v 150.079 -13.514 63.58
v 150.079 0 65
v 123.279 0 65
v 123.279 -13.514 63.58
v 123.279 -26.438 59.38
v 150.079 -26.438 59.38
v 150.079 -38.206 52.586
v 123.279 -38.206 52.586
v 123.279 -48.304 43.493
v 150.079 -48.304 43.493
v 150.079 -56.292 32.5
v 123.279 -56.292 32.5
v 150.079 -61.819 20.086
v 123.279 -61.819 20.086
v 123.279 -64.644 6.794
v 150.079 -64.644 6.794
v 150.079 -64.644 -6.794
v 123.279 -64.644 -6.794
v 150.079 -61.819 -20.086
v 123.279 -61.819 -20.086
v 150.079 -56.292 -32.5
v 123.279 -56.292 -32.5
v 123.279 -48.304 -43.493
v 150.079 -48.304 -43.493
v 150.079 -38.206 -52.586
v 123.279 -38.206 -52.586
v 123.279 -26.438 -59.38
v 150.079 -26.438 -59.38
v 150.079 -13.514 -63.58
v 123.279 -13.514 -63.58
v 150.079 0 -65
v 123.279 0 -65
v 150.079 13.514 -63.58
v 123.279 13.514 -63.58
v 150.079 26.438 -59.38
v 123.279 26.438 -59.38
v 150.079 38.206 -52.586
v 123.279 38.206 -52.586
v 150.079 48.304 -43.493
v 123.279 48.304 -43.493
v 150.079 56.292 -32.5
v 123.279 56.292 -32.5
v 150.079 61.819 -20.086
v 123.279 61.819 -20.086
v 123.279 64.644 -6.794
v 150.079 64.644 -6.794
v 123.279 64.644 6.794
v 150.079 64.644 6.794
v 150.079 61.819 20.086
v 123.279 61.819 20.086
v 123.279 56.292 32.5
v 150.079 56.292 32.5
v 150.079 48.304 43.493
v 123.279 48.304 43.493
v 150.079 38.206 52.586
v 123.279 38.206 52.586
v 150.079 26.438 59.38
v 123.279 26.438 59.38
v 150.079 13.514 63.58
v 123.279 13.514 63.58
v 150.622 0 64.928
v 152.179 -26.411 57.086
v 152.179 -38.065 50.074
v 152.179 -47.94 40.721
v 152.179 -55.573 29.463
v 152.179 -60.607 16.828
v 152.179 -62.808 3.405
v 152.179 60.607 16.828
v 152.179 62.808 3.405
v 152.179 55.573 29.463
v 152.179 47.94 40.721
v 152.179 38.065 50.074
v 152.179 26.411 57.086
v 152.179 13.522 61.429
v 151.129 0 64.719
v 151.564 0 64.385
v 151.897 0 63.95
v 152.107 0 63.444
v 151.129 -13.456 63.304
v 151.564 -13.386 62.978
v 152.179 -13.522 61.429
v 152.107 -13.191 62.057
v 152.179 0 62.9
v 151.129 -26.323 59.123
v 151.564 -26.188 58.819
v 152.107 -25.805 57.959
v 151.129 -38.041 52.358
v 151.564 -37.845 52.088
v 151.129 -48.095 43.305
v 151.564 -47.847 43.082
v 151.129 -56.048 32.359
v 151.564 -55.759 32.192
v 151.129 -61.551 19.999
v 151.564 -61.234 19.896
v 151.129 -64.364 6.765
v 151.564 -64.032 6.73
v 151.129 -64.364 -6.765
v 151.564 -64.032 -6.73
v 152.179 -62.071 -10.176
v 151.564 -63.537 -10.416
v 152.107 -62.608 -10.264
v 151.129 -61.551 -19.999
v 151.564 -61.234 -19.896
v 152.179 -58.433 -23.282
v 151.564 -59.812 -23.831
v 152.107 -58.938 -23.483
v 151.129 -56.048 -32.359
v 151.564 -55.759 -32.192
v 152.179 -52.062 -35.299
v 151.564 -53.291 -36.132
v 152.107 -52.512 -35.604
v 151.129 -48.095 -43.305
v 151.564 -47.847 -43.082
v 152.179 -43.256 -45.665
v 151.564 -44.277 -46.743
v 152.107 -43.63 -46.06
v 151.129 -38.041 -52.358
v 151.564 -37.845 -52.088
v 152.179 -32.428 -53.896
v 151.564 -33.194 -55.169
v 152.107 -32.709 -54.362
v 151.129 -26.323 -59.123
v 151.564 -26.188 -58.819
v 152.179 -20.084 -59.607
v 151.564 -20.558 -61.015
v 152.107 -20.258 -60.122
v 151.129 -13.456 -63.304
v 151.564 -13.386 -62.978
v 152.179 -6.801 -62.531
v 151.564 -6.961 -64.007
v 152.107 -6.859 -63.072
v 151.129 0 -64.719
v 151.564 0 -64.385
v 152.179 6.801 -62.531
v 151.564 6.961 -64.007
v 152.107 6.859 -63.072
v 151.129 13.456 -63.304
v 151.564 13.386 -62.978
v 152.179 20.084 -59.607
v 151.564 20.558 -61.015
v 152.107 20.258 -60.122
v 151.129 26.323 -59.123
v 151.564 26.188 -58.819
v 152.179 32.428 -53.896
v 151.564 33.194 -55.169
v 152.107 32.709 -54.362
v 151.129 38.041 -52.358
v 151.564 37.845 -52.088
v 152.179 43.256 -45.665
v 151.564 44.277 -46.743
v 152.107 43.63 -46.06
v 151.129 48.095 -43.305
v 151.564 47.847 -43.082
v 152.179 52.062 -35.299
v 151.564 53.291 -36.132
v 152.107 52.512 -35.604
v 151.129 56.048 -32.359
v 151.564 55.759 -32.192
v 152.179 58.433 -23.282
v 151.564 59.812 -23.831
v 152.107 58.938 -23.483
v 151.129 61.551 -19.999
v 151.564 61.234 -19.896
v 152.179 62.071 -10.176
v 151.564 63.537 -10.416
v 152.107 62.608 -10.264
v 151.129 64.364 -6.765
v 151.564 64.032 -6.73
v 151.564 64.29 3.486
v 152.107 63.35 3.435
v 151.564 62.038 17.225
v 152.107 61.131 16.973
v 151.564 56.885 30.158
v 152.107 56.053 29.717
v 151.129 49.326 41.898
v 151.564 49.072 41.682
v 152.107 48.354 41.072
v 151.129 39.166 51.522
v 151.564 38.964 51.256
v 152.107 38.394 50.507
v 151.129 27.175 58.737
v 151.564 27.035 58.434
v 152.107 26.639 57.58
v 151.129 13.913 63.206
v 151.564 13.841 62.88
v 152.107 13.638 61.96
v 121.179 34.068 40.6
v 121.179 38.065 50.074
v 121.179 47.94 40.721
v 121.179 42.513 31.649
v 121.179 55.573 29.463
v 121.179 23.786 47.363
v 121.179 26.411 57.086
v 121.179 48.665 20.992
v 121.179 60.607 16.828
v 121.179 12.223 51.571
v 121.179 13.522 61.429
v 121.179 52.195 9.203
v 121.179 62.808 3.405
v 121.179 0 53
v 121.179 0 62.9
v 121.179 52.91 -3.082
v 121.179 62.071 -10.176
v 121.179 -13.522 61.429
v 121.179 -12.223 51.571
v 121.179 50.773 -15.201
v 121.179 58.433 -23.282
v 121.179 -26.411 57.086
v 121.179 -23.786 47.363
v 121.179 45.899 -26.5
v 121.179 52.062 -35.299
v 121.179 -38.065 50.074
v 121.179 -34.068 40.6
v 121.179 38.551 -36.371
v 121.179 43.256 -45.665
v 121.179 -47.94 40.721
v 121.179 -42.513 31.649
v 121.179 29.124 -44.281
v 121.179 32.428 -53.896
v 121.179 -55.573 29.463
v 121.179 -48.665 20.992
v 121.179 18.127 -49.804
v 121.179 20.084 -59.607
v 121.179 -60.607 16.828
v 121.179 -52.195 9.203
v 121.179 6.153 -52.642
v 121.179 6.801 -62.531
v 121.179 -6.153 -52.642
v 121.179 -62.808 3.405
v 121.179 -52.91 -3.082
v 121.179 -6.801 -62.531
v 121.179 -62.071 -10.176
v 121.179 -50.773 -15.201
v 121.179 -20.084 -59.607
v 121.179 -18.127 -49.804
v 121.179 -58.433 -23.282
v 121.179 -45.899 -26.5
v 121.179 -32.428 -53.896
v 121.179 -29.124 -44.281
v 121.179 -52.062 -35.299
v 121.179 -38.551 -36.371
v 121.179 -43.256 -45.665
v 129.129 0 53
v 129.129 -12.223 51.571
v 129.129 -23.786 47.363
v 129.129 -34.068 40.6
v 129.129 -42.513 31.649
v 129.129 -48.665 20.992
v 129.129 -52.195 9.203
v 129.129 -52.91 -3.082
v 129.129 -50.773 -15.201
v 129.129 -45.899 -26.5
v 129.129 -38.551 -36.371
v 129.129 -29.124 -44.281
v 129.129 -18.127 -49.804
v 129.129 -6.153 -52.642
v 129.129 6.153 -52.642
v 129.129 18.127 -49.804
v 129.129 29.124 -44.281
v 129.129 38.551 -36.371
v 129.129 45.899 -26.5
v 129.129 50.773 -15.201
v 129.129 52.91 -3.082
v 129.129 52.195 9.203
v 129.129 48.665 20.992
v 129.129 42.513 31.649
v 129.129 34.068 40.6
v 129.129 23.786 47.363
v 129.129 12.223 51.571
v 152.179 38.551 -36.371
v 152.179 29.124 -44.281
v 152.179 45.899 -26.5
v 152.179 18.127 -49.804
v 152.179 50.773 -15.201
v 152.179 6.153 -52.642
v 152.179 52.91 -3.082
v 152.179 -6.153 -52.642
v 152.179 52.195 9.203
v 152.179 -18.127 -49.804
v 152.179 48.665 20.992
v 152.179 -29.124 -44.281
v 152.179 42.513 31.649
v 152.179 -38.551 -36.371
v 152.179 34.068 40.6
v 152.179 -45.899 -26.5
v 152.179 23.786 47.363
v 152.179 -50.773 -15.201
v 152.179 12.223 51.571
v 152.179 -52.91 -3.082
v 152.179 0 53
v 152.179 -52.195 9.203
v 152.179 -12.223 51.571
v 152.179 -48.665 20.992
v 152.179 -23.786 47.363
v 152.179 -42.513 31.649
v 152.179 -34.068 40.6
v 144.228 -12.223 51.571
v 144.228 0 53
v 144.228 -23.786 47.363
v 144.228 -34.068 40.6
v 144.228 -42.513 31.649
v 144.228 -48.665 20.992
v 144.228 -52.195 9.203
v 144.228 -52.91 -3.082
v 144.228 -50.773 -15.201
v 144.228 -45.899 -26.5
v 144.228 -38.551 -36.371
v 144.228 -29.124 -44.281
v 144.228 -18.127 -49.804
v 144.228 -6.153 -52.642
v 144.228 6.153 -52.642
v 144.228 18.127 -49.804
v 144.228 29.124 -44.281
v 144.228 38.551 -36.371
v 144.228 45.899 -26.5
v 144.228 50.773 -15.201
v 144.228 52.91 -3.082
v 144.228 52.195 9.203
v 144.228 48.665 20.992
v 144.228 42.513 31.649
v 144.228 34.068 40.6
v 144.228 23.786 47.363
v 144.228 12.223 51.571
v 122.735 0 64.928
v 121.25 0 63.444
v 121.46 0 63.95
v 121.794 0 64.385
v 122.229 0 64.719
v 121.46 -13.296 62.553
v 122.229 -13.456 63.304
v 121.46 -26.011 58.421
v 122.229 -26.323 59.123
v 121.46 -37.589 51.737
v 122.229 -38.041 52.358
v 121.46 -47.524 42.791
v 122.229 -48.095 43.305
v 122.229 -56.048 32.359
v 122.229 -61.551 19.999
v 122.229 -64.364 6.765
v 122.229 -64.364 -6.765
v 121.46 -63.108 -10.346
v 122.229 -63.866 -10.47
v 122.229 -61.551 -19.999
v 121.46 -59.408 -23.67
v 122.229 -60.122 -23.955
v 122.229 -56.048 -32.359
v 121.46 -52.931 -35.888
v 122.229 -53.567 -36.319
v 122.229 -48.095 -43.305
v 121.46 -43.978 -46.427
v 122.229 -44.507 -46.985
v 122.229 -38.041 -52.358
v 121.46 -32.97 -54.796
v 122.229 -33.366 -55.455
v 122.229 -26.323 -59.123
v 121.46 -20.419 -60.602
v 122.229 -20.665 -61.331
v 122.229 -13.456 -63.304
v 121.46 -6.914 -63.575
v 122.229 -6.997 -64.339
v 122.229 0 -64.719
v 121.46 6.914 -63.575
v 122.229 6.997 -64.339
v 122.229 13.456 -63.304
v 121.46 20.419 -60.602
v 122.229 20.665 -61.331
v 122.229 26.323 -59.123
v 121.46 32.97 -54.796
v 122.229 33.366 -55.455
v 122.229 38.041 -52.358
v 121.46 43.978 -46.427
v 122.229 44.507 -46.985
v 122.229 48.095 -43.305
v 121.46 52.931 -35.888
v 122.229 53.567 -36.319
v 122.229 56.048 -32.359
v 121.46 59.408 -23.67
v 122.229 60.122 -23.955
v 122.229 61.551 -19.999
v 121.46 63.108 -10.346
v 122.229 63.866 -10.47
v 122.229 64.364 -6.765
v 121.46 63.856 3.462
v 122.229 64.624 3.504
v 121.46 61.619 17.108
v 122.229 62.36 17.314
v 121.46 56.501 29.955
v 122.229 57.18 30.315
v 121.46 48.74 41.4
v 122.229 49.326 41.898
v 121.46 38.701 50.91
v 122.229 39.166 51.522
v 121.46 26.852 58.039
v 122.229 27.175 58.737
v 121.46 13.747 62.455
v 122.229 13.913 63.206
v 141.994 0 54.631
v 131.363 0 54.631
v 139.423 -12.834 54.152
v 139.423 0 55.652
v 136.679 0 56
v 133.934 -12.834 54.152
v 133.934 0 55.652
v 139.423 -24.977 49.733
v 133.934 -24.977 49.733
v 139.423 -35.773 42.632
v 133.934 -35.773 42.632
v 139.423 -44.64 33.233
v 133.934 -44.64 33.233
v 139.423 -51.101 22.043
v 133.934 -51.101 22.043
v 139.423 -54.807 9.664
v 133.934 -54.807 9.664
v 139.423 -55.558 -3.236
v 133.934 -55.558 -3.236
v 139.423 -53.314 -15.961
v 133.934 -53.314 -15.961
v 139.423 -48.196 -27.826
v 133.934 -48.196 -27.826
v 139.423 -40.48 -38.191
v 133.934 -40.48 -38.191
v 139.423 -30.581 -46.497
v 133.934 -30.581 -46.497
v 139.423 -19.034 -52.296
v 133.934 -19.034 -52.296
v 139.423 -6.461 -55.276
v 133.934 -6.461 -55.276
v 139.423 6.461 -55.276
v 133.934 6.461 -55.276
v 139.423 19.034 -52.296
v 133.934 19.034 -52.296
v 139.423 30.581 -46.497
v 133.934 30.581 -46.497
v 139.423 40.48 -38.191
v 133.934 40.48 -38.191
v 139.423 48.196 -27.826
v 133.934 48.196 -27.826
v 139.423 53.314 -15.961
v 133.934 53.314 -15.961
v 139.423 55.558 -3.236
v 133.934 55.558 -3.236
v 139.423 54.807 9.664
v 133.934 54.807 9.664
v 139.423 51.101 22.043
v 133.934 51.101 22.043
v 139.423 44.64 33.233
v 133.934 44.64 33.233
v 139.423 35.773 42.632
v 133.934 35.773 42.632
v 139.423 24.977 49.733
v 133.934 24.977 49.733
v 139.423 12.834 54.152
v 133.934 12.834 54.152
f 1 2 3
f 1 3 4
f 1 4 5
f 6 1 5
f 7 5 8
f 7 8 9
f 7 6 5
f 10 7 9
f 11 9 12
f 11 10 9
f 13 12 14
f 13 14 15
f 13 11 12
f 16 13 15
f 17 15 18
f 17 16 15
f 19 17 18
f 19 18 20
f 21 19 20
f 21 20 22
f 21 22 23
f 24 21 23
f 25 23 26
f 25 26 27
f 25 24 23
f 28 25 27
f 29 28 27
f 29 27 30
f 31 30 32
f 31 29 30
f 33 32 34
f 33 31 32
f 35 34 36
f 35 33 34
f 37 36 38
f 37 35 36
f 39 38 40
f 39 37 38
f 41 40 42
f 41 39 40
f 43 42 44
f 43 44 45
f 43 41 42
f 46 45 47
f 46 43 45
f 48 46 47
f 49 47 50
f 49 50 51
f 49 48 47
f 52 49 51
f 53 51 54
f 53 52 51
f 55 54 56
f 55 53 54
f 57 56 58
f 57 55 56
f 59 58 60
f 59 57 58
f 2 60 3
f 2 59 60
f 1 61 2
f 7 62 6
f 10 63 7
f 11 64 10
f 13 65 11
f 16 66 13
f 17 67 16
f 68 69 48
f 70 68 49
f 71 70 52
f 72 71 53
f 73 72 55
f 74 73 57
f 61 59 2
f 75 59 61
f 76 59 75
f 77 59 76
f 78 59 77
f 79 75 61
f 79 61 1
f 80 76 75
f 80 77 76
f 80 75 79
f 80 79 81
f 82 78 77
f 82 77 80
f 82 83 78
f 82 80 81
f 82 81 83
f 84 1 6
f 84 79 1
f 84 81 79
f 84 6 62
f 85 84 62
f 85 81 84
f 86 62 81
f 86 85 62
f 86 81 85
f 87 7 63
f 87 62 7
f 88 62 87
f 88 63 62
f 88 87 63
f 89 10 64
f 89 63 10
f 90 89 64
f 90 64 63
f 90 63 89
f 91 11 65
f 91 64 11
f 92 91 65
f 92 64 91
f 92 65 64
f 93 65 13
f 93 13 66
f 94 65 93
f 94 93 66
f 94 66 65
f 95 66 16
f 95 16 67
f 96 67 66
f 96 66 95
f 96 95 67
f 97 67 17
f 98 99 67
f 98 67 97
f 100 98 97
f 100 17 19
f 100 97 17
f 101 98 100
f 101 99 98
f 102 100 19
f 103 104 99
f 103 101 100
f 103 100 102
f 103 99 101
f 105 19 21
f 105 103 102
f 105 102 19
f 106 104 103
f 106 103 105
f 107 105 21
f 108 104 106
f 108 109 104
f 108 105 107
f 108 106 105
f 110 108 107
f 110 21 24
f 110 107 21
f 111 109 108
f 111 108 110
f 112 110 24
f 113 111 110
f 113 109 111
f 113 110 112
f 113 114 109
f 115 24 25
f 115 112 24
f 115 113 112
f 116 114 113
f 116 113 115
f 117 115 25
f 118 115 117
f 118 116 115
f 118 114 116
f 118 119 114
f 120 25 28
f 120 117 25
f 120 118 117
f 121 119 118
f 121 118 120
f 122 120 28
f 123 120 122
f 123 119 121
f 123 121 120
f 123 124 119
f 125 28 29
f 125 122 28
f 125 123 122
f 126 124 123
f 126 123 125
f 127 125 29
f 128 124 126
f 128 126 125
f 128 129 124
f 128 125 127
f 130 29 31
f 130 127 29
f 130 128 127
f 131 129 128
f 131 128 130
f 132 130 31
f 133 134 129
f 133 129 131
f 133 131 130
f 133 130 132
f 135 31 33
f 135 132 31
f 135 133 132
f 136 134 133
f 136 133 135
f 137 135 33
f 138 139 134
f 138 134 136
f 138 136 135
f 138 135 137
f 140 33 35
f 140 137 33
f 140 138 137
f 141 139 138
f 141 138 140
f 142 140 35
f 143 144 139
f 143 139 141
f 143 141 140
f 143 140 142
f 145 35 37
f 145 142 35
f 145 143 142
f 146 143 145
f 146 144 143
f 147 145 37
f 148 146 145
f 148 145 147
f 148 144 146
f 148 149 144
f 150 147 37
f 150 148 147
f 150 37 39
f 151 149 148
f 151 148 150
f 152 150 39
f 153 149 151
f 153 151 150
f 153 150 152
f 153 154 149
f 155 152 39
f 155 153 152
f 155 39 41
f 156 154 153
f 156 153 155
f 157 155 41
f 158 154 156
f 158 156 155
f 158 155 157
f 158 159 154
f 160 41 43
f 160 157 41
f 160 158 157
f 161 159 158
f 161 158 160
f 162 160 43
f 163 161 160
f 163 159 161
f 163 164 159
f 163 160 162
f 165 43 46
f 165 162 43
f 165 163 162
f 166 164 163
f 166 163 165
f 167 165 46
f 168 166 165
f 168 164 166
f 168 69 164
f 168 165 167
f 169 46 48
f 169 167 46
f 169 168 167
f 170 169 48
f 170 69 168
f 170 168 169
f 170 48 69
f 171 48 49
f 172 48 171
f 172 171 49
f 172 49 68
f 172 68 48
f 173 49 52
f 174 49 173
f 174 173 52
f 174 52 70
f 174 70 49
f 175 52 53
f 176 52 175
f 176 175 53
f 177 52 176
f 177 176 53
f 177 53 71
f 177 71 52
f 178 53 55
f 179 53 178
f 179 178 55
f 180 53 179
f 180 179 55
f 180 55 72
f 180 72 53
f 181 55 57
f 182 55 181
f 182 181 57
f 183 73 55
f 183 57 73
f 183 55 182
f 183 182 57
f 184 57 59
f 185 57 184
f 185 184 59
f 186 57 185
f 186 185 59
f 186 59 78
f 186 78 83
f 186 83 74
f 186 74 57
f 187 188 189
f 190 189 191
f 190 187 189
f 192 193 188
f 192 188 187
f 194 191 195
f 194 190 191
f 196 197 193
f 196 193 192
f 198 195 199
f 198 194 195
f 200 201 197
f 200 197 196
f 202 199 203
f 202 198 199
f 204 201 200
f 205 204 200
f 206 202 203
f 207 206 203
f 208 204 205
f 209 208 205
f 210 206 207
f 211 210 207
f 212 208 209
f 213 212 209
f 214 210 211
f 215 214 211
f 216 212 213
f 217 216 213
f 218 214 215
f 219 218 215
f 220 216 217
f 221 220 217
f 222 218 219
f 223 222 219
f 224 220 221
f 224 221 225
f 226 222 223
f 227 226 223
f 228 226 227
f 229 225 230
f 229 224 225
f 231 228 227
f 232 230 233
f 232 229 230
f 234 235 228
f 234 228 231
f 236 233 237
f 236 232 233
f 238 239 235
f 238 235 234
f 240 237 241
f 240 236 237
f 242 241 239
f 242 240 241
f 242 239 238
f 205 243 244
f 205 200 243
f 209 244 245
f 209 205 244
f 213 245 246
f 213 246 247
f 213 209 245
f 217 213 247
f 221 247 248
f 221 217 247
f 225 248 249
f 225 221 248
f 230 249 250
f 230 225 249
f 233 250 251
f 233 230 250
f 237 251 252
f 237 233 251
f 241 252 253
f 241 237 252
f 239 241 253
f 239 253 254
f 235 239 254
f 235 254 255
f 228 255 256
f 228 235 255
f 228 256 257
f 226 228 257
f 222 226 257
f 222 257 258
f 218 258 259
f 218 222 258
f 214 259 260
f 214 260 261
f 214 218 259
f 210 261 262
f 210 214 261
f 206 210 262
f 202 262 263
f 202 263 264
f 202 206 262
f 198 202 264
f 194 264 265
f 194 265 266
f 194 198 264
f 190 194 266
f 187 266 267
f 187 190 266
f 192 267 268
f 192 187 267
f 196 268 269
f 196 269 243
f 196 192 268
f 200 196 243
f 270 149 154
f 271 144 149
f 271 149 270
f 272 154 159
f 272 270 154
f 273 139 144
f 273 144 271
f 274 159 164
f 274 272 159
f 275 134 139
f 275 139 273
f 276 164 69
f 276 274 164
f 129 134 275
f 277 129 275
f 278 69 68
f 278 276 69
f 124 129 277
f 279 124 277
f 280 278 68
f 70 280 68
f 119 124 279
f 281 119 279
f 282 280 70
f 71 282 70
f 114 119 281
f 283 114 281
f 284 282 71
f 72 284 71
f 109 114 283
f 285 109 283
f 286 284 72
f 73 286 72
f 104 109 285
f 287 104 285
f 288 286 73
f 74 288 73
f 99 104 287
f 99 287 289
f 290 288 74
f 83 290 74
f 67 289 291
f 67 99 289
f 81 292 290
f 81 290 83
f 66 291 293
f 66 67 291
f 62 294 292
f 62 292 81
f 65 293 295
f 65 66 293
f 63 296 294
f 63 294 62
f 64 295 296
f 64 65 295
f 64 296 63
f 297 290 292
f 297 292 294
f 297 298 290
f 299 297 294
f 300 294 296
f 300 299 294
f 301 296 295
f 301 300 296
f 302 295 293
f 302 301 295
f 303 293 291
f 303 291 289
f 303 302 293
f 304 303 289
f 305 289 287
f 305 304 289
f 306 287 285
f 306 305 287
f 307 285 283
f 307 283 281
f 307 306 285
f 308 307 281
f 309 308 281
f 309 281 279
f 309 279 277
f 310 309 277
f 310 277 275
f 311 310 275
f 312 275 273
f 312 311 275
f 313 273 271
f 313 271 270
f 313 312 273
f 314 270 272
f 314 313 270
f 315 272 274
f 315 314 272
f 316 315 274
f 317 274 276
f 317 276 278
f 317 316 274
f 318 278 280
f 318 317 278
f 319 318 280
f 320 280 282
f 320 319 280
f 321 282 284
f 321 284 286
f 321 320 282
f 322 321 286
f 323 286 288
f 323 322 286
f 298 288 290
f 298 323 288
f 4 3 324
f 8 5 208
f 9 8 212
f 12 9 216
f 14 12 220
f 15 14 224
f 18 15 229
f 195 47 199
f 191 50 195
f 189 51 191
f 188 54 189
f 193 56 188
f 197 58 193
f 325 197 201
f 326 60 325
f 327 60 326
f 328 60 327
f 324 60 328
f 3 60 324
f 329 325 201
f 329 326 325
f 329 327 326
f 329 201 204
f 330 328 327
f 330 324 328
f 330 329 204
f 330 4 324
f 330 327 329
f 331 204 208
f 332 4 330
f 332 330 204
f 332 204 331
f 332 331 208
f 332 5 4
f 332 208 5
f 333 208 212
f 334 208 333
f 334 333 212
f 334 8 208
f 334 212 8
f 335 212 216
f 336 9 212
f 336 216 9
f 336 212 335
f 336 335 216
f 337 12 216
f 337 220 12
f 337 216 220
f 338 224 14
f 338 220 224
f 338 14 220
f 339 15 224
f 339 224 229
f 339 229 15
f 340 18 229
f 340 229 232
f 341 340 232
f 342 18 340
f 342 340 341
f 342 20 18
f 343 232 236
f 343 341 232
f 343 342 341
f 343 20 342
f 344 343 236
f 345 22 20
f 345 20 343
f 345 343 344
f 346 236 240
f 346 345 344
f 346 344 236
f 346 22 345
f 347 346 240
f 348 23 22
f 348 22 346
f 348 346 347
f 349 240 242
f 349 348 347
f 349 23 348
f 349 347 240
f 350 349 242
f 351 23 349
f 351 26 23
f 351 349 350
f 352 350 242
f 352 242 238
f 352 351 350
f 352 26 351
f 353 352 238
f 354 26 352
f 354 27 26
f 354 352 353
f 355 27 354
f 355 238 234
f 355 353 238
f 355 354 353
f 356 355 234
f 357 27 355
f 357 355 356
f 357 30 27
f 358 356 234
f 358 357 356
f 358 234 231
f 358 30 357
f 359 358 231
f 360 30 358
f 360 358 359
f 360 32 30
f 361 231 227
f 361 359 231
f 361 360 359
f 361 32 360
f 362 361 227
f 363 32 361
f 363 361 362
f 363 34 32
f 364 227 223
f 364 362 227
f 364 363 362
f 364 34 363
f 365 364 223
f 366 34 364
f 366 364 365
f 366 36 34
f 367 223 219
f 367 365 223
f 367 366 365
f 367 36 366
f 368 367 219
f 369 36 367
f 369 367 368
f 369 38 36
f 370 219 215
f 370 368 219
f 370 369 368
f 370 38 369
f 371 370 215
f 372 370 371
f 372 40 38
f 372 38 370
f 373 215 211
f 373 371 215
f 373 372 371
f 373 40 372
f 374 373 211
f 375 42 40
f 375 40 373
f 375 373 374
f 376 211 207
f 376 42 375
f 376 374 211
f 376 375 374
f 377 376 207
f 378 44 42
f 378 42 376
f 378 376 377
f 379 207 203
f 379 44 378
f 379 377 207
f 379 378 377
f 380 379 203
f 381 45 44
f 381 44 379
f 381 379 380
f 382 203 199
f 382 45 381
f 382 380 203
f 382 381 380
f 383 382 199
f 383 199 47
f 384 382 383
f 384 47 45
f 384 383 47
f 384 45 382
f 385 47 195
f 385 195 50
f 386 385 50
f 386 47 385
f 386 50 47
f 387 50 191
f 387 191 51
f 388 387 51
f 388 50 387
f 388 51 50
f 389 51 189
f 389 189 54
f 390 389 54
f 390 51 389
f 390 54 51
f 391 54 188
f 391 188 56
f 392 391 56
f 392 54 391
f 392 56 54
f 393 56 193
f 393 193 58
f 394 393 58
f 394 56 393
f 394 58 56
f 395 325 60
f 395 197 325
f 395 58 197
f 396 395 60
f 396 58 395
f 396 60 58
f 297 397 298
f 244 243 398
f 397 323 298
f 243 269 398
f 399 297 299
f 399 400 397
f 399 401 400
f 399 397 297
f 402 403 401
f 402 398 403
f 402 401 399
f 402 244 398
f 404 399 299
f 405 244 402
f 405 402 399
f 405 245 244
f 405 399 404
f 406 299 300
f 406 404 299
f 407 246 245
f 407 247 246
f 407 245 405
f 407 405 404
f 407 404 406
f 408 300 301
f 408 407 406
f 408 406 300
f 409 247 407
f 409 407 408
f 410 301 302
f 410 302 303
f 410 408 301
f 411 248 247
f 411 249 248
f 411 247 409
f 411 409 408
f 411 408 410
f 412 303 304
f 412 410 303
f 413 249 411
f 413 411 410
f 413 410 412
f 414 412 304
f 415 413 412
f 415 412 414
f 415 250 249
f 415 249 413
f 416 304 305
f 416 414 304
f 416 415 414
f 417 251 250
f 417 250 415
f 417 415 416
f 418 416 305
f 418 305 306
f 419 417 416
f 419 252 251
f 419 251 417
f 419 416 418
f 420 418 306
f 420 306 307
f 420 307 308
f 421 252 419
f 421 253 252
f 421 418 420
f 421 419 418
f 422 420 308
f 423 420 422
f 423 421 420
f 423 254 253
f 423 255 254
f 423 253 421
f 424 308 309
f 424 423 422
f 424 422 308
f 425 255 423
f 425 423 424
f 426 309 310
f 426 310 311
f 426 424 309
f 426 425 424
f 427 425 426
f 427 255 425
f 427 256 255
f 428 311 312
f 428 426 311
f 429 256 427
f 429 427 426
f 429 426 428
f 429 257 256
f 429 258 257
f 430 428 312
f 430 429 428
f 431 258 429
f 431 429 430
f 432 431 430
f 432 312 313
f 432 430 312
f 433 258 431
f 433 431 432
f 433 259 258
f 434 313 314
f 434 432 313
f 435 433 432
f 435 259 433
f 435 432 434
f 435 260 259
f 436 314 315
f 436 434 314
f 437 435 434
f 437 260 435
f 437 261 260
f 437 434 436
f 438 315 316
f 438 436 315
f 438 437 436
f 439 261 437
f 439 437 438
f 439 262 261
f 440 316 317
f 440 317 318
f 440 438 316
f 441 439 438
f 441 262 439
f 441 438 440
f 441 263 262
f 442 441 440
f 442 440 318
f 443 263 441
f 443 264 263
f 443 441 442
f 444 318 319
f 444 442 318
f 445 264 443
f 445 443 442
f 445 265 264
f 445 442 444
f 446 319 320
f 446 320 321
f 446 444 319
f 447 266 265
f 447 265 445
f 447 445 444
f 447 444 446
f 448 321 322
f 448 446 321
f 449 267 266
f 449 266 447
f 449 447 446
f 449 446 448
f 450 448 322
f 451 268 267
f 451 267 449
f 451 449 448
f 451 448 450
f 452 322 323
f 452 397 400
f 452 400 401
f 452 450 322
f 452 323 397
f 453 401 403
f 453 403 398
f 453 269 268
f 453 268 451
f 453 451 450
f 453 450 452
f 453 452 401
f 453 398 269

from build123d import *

# Parameters (mm, degrees)
FILLET2_R = 2.1


with BuildPart() as part:
    # Sketch1 → Revolve1 (revolve)
    with BuildSketch(Plane(origin=(0, 0, 0), x_dir=(1, 0, 0), z_dir=(0, 1, 0)), mode=Mode.PRIVATE) as revolve1_sk:
        with BuildLine():
            Line((152.17858106, 53), (144.228415495, 53))
            ThreePointArc((144.228415495, 53), (136.67858106, 56), (129.128746624, 53))
            Line((129.128746624, 53), (121.17858106, 53))
            Line((121.17858106, 53), (121.17858106, 65))
            Line((121.17858106, 65), (152.17858106, 65))
            Line((152.17858106, 65), (152.17858106, 53))
        make_face()
    revolve(revolve1_sk.sketch.rotate(Axis((-165.426008969, 0, 0), (1, 0, 0)), 180), axis=Axis((-165.426008969, 0, 0), (1, 0, 0)))

    # Fillet2
    fillet2_edges = [part.edges().sort_by_distance(p)[0] for p in [
        (152.17858106, 0, -65),
        (121.17858106, 0, -65),
    ]]
    fillet(fillet2_edges, radius=FILLET2_R)


solid = part.part
